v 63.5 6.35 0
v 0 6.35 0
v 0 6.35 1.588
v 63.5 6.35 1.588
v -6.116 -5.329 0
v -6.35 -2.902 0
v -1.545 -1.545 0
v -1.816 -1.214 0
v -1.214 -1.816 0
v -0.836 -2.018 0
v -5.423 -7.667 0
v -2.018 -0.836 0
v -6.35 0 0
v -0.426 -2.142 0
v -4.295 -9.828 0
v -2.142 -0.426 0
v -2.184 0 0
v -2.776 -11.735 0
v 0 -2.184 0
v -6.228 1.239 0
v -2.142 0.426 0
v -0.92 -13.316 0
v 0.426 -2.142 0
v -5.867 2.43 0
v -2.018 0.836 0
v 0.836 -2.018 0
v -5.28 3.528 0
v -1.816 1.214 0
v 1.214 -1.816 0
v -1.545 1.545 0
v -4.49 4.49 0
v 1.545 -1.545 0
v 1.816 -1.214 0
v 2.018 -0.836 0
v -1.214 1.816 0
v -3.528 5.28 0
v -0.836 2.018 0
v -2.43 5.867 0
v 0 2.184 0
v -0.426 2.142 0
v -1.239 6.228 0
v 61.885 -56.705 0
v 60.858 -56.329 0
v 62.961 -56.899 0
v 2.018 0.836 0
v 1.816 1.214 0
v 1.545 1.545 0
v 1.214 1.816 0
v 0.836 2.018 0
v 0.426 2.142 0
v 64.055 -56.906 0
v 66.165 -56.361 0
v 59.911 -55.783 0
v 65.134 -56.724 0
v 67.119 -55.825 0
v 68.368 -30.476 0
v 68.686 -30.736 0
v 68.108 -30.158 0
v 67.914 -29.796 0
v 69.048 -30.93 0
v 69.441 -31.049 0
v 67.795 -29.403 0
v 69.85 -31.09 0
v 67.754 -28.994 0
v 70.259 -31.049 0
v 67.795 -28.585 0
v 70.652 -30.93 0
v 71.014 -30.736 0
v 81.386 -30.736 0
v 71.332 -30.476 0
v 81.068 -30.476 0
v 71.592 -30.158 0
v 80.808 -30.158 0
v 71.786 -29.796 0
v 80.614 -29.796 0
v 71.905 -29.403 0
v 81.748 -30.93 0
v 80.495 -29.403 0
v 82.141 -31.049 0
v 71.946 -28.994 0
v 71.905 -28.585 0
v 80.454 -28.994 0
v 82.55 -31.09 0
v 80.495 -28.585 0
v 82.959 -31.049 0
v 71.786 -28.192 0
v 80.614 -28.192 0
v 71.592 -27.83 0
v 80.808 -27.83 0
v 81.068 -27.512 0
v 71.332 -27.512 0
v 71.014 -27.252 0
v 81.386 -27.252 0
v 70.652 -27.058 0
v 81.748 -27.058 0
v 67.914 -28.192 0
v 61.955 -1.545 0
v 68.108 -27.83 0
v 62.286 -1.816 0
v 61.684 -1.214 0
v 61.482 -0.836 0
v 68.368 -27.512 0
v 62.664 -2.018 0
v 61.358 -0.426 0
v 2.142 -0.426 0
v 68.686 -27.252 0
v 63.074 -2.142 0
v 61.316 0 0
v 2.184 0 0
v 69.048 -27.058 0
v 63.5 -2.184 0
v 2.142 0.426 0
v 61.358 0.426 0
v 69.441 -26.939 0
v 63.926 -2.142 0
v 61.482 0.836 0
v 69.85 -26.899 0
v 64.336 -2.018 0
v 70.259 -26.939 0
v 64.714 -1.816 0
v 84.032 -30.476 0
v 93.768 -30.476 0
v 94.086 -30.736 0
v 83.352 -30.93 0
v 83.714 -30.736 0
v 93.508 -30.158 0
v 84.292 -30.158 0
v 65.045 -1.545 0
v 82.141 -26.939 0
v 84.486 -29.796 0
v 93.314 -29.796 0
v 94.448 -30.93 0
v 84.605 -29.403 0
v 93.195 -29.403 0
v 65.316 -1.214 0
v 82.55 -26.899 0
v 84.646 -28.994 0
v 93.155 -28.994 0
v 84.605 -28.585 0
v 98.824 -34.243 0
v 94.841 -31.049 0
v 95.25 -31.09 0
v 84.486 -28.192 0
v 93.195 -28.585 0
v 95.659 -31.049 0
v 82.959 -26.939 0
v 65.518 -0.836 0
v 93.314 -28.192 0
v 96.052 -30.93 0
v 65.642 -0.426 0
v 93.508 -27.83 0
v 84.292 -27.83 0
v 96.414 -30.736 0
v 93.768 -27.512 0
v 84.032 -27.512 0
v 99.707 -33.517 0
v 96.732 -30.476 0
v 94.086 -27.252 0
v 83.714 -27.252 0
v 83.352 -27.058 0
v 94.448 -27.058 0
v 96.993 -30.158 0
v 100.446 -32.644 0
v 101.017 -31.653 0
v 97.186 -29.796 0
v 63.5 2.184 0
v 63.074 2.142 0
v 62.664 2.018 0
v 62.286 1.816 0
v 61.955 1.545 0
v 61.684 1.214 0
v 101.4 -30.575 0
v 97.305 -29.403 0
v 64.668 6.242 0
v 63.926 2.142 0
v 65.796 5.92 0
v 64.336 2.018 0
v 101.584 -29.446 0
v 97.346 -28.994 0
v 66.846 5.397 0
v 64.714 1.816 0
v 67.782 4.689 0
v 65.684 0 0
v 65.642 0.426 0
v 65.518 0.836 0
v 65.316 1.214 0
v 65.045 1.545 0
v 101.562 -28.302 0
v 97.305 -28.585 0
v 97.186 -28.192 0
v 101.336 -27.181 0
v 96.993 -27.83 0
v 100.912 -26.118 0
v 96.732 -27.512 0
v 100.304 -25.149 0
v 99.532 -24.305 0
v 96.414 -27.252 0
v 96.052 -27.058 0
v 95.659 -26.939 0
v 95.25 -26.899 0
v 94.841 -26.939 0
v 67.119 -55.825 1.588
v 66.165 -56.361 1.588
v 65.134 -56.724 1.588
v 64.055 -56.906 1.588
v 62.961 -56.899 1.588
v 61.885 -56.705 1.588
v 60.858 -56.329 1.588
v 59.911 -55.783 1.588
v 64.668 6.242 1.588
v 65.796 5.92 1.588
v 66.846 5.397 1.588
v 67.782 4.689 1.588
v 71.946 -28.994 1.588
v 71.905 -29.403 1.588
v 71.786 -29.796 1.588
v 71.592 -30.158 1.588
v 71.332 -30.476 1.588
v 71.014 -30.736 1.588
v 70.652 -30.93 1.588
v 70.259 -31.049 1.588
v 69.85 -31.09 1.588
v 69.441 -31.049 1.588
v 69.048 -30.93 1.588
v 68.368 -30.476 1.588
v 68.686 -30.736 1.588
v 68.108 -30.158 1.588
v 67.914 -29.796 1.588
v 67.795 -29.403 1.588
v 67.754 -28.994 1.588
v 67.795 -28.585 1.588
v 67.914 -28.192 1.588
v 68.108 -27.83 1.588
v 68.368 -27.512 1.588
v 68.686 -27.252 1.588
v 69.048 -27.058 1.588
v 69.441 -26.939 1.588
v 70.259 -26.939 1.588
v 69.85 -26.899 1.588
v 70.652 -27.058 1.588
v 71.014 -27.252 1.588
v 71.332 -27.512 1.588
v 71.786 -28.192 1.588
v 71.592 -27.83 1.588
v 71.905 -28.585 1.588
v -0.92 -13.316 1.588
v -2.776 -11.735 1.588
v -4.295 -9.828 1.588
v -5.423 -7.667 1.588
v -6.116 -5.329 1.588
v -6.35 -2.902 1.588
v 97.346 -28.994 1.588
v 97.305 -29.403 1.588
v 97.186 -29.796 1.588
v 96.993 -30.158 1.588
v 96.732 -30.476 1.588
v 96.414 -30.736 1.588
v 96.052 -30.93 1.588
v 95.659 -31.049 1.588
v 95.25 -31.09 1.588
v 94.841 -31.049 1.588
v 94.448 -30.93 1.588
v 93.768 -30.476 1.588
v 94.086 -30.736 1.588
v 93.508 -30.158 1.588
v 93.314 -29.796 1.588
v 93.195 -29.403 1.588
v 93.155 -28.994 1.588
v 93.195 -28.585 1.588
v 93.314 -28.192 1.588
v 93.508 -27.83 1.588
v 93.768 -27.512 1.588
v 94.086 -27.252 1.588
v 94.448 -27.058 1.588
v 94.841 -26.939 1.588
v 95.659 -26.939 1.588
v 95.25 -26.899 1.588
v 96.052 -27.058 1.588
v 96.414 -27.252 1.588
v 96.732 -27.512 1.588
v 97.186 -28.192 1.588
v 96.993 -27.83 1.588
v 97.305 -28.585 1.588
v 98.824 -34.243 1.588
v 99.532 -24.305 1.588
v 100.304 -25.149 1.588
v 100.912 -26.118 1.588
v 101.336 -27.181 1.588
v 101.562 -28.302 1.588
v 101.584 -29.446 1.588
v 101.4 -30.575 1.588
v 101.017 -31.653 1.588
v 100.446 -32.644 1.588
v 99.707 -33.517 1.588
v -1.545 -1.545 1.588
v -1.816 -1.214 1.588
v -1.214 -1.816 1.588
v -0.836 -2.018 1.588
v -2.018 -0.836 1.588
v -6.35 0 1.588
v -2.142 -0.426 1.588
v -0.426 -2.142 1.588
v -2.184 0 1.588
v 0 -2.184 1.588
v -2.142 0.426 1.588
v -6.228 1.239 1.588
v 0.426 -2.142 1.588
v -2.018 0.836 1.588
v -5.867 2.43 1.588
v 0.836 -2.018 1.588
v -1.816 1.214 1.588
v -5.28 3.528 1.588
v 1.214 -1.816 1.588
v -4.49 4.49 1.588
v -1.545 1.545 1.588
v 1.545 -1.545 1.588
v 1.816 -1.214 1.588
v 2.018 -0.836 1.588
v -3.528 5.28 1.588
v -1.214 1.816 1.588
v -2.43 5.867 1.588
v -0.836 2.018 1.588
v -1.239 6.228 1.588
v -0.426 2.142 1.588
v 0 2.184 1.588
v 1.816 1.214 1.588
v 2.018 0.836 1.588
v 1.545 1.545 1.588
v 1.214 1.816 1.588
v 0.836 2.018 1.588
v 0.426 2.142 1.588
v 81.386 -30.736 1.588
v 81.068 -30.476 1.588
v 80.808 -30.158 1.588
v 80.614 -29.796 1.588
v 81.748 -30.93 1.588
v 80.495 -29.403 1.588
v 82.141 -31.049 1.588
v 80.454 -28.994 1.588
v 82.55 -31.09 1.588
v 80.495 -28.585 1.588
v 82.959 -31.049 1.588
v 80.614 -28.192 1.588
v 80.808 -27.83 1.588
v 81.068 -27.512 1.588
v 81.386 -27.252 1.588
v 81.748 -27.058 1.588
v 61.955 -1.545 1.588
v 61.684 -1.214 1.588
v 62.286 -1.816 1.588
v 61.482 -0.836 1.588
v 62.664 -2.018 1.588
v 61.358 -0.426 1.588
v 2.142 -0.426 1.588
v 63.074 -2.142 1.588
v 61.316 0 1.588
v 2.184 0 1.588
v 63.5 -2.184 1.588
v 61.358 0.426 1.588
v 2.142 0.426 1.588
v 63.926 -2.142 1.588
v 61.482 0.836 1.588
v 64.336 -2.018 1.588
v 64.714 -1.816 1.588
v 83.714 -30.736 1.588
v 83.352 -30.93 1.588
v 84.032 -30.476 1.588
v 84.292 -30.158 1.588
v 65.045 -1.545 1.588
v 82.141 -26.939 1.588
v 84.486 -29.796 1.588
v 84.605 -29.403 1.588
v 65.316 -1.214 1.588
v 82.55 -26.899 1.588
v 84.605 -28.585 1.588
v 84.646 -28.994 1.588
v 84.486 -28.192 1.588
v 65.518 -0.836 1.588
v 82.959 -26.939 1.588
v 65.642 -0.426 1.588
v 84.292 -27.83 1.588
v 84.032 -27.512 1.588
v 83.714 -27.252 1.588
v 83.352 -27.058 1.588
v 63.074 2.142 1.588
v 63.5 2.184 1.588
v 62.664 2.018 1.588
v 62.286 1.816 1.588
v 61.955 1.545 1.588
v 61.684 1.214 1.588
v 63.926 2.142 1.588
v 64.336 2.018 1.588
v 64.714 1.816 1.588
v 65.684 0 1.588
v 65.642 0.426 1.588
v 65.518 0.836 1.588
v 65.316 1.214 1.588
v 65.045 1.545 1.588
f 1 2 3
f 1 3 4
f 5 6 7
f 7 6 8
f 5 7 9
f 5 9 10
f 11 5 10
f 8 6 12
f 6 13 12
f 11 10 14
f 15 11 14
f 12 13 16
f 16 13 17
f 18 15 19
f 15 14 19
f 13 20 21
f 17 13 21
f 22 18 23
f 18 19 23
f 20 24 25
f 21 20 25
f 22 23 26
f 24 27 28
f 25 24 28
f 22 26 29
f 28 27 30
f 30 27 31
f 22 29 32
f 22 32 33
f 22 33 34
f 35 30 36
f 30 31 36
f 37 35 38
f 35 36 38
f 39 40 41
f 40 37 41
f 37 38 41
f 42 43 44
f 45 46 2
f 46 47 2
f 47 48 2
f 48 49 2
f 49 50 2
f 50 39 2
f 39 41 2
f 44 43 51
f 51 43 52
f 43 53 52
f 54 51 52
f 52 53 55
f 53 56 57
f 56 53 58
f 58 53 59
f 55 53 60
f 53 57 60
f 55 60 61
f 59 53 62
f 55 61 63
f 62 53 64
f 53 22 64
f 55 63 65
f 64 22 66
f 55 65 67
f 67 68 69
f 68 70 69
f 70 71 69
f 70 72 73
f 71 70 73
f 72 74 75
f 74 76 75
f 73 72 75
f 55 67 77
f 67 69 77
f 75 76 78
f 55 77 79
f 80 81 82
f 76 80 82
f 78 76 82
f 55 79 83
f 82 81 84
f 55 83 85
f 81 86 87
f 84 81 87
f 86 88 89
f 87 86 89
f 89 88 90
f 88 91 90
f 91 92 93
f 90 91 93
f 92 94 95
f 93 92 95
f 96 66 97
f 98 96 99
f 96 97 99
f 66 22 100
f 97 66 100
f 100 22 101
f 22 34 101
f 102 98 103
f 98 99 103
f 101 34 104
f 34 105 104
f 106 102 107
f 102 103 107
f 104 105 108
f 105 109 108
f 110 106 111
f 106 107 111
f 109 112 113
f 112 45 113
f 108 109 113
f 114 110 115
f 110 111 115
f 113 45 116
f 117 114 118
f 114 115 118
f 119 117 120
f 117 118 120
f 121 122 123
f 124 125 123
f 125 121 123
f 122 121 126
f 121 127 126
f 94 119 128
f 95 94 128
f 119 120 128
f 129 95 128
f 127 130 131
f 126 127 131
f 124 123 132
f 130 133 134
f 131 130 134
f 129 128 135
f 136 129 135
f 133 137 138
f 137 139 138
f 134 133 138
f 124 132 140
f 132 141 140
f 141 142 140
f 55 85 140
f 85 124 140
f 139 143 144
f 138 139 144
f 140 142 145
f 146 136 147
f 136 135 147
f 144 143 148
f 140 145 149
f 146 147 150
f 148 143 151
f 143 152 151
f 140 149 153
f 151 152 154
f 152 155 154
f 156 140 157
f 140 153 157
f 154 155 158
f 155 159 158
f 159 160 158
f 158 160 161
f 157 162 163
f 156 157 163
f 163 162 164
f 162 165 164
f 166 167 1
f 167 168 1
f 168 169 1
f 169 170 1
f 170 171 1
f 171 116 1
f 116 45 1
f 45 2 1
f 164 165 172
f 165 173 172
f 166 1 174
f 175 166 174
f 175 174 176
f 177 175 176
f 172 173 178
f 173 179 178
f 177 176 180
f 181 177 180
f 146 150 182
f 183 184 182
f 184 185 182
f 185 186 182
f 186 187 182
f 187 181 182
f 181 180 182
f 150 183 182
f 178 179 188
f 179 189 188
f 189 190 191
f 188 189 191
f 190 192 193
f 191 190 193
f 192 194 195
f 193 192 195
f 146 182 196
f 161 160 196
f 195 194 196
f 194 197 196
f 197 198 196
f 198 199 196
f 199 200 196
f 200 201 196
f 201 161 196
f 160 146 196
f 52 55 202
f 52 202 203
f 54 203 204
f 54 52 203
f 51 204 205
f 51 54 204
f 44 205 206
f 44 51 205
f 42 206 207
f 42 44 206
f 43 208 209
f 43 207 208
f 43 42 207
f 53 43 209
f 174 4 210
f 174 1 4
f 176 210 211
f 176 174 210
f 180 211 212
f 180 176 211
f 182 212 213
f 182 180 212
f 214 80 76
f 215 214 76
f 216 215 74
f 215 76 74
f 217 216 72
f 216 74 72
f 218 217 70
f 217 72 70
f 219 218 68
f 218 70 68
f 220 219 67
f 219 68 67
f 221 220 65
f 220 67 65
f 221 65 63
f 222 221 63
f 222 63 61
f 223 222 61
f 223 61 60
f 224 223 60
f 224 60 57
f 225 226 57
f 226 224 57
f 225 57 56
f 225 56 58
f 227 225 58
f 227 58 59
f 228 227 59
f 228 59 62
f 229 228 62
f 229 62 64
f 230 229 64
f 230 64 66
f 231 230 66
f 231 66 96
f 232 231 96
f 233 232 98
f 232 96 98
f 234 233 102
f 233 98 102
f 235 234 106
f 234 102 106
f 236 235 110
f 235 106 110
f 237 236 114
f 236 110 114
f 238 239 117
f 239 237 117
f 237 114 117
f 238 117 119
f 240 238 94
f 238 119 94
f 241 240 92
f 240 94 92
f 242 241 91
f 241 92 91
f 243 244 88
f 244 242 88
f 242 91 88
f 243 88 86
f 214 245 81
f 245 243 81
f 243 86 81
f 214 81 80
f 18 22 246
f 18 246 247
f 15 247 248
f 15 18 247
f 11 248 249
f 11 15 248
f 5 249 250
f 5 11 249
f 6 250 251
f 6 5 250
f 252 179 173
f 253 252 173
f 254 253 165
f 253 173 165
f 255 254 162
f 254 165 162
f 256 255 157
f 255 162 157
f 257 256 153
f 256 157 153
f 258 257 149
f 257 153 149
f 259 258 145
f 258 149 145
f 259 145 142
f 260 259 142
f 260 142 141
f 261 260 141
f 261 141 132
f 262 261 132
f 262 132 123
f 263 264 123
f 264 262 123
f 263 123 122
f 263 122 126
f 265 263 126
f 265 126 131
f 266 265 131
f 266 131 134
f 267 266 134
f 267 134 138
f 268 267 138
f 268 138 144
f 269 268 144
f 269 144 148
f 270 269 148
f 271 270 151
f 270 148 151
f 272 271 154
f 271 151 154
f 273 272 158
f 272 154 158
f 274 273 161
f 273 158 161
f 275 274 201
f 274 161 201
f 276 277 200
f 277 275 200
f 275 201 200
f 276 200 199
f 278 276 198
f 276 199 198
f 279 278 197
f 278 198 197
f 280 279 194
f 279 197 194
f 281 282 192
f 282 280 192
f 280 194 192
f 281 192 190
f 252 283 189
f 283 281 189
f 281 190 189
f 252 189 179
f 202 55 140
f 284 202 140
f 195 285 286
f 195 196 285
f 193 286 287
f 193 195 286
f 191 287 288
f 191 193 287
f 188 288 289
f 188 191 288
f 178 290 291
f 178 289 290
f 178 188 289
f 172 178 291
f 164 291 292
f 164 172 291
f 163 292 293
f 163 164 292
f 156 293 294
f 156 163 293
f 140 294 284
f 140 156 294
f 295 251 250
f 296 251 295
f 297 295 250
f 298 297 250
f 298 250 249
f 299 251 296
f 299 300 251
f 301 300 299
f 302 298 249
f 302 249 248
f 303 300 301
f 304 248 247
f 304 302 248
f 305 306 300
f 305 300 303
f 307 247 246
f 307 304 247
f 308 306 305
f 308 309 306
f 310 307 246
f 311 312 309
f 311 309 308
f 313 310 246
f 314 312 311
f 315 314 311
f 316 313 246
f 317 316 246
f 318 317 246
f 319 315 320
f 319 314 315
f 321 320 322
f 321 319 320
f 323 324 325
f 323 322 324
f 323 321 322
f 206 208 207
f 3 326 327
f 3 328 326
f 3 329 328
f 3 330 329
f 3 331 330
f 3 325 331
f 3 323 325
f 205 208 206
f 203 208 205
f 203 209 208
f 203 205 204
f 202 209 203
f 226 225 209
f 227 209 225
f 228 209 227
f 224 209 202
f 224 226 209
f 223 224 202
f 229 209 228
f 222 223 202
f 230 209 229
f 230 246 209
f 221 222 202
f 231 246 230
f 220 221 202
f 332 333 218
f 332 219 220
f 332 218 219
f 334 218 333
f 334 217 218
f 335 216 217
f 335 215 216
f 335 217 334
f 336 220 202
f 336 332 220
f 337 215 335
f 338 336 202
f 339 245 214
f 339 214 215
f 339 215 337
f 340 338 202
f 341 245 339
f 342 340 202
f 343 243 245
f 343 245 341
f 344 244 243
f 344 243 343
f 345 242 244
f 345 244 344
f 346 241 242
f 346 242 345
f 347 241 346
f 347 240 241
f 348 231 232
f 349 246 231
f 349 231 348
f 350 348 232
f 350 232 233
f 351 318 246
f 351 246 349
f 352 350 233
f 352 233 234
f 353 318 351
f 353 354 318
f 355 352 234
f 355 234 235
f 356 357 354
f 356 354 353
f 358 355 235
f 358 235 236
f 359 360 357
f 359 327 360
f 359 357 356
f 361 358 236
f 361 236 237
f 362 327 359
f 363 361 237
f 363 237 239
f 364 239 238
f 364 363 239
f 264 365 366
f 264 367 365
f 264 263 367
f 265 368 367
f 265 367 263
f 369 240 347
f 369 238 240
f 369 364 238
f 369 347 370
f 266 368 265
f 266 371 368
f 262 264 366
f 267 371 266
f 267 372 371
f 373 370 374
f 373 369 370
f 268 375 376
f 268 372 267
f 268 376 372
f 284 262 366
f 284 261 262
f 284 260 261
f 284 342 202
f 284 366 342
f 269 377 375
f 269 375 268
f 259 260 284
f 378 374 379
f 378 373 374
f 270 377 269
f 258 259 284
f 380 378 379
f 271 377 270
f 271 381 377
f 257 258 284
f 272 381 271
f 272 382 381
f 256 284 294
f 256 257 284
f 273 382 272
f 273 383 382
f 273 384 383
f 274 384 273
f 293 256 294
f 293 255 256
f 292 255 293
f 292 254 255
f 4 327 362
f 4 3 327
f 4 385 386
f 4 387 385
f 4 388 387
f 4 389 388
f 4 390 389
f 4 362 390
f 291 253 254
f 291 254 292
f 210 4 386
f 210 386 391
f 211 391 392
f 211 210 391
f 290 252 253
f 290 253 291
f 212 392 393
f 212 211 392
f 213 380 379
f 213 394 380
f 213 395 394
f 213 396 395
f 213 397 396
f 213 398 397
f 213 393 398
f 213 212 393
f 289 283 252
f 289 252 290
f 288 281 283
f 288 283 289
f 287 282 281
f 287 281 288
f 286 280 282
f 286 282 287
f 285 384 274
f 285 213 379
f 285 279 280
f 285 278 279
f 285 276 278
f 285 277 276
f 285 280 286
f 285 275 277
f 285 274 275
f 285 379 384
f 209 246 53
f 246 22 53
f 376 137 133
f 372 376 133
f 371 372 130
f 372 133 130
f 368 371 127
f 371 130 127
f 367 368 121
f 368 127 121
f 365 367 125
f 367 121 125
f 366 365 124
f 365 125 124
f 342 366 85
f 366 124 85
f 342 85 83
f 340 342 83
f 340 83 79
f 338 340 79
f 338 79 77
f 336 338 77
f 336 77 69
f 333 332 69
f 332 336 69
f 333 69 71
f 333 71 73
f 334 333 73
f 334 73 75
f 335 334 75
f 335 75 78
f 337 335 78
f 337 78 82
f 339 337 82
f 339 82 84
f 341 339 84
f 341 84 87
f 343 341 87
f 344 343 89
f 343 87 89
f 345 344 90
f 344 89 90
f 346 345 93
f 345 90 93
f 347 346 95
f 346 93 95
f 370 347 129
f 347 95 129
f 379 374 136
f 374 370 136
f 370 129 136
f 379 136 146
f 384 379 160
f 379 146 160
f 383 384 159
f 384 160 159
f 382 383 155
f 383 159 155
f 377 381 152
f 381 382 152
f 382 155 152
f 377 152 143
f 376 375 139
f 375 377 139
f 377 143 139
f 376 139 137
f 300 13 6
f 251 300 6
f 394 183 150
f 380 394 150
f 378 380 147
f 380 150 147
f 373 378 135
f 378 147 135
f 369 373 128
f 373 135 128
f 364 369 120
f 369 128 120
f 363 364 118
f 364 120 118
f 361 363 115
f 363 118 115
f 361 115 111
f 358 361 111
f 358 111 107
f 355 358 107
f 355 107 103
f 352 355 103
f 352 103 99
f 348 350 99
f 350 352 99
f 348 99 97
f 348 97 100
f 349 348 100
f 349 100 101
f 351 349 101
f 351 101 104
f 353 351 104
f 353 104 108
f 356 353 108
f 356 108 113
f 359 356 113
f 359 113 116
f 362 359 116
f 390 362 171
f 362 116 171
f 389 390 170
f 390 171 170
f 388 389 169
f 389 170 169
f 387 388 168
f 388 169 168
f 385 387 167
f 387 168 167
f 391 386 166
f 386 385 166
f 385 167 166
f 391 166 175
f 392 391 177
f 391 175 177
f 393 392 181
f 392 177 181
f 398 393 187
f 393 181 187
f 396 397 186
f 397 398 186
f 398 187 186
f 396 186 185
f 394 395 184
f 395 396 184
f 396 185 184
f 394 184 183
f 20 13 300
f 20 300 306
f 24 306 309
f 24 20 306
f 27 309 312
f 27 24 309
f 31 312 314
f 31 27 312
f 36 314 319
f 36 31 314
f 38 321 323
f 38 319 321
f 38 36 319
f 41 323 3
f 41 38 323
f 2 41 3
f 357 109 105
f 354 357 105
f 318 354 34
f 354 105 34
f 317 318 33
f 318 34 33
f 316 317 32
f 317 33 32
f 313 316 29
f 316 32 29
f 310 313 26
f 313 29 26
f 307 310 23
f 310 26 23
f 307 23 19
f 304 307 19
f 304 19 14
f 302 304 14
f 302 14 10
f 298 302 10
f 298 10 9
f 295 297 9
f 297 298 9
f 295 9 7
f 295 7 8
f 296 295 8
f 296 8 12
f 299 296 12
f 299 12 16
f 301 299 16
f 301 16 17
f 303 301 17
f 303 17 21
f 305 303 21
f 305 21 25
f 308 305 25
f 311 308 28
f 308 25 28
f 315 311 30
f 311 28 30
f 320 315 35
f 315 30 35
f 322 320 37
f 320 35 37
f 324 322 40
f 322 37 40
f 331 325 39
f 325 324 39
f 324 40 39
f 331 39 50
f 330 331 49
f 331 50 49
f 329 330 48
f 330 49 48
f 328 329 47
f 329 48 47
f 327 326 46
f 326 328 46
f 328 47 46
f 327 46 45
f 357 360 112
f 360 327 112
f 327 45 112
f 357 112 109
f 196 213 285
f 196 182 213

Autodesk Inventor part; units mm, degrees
ref_plane "YZ Plane" through (0, 0, 0) normal (1, 0, 0) x (0, 1, 0)
ref_plane "XZ Plane" through (0, 0, 0) normal (0, 1, 0) x (-1, 0, 0)
ref_plane "XY Plane" through (0, 0, 0) normal (0, 0, 1) x (1, 0, 0)
sketch "main" plane through (0, 0, 0) normal (0, 0, 1) x (1, 0, 0)
  circle A0 centre (-16.6212, -19.5437) radius 2.1844
  arc A1 (-20.9032, -24.2328) -> (-16.6212, -25.8937) centre (-16.6212, -19.5437) ccw
  circle A2 centre (-22.9712, 9.4504) radius 2.0955
  arc A3 (-13.0318, 36.2391) -> (-20.24, 36.2816) centre (-16.6667, 31.0324) ccw
  line L0 (-20.9032, -24.2328) -> (-52.6534, 4.7613)
  circle A4 centre (-35.6713, 9.4504) radius 2.0955
  circle A5 centre (-48.3714, 9.4504) radius 2.0955
  arc A6 (-51.9447, 14.6996) -> (-52.6534, 4.7613) centre (-48.3714, 9.4504) ccw
  line L1 (-20.24, 36.2816) -> (-51.9447, 14.6996)
  circle A7 centre (46.8788, -19.5437) radius 2.1844
  arc A8 (46.8788, -25.8937) -> (53.2288, -19.5437) centre (46.8788, -19.5437) ccw
  line L2 (47.7986, -6.2278) -> (-13.0318, 36.2391)
  line L3 (46.8788, -25.8937) -> (-16.6212, -25.8937)
  arc A9 (53.2288, -16.6412) -> (47.7986, -6.2278) centre (40.5288, -16.6412) ccw
  line L4 (53.2288, -19.5437) -> (53.2288, -16.6412)
  point P0 (0.102, -2.5446)
  point P1 (53.2288, -10.0187)
  dimension "d0" = 12.7
  dimension "d1" = 9.525
  dimension "d2" = 12.7
  dimension "d3" = 12.7
  dimension "d4" = 6.35
  dimension "d5" = 4.191
  dimension "d6" = 4.191
  dimension "d7" = 4.191
sketch "Sketch1" plane through (0, 0, 0) normal (0, 0, 1) x (1, 0, 0)
  circle A0 centre (63.5, 0) radius 2.1844
  arc A1 (67.782, 4.689) -> (63.5, 6.35) centre (63.5, 0) ccw
  circle A2 centre (69.85, -28.9941) radius 2.0955
  arc A3 (59.9106, -55.7828) -> (67.1187, -55.8253) centre (63.5455, -50.5761) ccw
  line L0 (67.782, 4.689) -> (99.5322, -24.3051)
  circle A4 centre (82.55, -28.9941) radius 2.0955
  circle A5 centre (95.2502, -28.9941) radius 2.0955
  arc A6 (98.8235, -34.2433) -> (99.5322, -24.3051) centre (95.2502, -28.9941) ccw
  line L1 (67.1187, -55.8253) -> (98.8235, -34.2433)
  circle A7 centre (0, 0) radius 2.1844
  arc A8 (0, 6.35) -> (-6.35, 0) centre (0, 0) ccw
  line L2 (-0.9198, -13.3159) -> (59.9106, -55.7828)
  line L3 (0, 6.35) -> (63.5, 6.35)
  arc A9 (-6.35, -2.9025) -> (-0.9198, -13.3159) centre (6.35, -2.9025) ccw
  line L4 (-6.35, 0) -> (-6.35, -2.9025)
  point P0 (0, 0)
extrude "Extrusion1" add sketch "Sketch1" along normal blind 1.5875
properties part number "sled" material "Acetal Resin, White"
